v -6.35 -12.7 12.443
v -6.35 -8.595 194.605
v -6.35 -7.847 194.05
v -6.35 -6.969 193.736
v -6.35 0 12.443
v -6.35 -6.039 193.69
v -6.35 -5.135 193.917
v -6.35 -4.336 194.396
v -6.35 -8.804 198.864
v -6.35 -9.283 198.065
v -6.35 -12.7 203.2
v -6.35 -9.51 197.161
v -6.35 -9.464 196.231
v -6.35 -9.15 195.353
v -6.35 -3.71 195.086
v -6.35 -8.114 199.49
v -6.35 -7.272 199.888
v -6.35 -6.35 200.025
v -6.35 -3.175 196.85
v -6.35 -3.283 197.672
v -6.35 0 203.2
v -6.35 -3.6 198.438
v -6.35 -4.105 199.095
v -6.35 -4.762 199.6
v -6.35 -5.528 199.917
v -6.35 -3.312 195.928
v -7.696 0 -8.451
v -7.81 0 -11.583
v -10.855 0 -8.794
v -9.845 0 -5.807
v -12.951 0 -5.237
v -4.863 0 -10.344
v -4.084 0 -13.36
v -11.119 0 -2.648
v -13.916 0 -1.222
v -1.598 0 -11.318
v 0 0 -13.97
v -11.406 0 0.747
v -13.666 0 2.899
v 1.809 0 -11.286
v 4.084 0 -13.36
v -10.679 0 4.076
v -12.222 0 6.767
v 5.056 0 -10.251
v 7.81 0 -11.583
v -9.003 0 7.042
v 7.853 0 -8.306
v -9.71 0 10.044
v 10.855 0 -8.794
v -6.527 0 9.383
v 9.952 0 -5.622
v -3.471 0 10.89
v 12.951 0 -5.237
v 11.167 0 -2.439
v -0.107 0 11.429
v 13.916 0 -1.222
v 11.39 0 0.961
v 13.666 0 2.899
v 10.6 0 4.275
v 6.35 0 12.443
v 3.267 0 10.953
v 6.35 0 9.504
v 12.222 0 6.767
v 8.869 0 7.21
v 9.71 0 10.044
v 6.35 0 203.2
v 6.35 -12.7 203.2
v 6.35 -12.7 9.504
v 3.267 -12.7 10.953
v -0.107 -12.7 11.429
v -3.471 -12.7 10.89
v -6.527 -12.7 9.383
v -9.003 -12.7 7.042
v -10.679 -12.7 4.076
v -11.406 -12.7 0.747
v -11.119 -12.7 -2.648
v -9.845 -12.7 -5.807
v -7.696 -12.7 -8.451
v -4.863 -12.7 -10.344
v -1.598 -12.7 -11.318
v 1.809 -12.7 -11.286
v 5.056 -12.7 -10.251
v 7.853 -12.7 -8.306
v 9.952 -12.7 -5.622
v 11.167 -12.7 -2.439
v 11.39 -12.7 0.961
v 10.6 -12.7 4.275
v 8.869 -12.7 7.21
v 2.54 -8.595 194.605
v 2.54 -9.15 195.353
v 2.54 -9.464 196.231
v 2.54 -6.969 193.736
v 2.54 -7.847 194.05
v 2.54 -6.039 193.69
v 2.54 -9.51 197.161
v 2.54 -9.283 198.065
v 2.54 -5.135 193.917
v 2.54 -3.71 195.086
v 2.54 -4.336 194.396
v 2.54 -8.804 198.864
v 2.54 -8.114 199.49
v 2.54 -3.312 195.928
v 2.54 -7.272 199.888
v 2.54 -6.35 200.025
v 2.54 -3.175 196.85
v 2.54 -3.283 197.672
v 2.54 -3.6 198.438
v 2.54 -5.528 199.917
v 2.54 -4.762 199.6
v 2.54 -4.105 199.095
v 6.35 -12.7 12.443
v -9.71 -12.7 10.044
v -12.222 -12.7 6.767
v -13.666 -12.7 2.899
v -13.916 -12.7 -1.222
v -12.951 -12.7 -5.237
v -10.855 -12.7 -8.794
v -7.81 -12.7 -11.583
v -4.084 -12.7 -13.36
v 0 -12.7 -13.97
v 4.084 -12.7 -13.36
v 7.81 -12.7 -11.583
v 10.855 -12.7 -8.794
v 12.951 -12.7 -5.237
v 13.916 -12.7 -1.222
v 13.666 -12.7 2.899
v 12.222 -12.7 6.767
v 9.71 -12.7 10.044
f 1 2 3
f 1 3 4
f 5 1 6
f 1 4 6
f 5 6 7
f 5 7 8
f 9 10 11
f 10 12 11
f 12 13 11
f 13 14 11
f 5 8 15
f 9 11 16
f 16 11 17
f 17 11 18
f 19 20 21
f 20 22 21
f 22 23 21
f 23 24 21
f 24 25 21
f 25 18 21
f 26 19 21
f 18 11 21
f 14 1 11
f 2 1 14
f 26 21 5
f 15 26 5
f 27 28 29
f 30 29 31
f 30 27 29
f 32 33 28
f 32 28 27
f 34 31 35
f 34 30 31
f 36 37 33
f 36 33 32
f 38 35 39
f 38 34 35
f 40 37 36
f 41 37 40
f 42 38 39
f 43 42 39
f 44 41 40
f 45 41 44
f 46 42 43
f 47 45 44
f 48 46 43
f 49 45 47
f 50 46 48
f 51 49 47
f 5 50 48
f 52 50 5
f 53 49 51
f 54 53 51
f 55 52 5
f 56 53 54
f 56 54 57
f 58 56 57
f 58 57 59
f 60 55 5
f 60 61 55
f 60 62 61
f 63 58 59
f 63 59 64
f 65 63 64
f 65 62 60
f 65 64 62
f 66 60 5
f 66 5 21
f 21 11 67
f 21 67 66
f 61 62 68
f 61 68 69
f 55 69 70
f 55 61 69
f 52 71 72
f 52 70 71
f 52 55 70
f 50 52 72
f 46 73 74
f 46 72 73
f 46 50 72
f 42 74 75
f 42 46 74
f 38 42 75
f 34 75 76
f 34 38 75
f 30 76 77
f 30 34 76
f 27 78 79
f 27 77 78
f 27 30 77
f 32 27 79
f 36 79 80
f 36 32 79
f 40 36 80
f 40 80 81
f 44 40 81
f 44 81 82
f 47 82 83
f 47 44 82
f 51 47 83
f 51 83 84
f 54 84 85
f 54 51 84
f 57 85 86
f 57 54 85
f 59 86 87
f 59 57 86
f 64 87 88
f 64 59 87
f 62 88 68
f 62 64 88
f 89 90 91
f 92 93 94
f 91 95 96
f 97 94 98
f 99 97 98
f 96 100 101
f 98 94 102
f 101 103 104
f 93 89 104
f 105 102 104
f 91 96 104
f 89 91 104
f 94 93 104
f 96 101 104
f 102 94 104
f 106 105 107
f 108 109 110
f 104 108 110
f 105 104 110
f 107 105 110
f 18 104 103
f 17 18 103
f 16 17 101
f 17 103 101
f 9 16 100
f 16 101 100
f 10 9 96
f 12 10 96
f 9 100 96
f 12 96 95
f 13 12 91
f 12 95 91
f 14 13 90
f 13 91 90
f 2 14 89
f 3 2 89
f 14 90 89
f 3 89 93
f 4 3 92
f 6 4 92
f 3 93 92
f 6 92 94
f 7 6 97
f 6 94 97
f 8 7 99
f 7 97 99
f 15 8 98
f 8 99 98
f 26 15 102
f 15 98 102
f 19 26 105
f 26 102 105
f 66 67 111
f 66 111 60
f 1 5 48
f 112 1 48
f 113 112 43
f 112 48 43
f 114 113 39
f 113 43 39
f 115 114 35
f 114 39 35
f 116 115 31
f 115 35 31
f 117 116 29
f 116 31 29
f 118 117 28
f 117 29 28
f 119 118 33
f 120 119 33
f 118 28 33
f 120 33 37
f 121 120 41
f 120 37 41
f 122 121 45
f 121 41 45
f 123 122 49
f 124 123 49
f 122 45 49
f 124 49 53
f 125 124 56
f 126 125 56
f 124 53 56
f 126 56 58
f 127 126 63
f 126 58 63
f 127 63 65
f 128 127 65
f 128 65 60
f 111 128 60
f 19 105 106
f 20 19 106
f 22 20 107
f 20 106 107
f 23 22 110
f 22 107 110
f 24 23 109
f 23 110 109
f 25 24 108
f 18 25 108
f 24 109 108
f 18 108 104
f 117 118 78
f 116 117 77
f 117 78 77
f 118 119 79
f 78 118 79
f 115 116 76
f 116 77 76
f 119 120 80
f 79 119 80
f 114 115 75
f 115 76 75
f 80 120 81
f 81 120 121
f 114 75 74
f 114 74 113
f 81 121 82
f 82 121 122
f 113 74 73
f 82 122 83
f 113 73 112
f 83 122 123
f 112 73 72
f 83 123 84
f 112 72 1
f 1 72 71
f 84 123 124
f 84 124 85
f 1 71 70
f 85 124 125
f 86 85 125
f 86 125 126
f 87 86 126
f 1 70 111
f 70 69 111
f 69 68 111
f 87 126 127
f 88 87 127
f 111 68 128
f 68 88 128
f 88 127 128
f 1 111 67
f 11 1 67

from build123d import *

# Parameters (mm, degrees)
F0_R          = 13.97
F0_R_2        = 11.43
F1_DEPTH      = 12.7
F2_W          = 12.7
F2_H          = 203.2
F3_DEPTH      = 6.35
F3_DEPTH_BACK = 6.35
F4_DEPTH      = 25.4
F6_START      = -3.81
F6_DEPTH      = 10.54779


with BuildPart() as f1:
    # F0 (on Front) → F1 (new body)
    with BuildSketch(Plane.XZ):
        Circle(F0_R)
        Circle(F0_R_2, mode=Mode.SUBTRACT)
    extrude(amount=F1_DEPTH)

    # F2 (on Right) → F3 (join, two sides)
    with BuildSketch(Plane.YZ) as f3_sk:
        with Locations((-6.35, 101.6)):
            Rectangle(F2_W, F2_H)
    extrude(amount=F3_DEPTH)
    extrude(f3_sk.sketch, amount=-F3_DEPTH_BACK)

    # F0 (on Front) → F4 (cut)
    with BuildSketch(Plane.XZ):
        Circle(F0_R_2)
    extrude(amount=F4_DEPTH, mode=Mode.SUBTRACT)

    # F5 (on face) → F6 (cut)
    with BuildSketch(Plane.YZ.offset(6.35).offset(F6_START)):
        with BuildLine():
            ThreePointArc((-3.175, 196.85), (-4.1049359697, 199.0950640303), (-6.35, 200.025))
            ThreePointArc((-6.35, 200.025), (-8.5950640303, 194.6049359697), (-3.175, 196.85))
        make_face()
    extrude(amount=-F6_DEPTH, mode=Mode.SUBTRACT)


solid = f1.part
